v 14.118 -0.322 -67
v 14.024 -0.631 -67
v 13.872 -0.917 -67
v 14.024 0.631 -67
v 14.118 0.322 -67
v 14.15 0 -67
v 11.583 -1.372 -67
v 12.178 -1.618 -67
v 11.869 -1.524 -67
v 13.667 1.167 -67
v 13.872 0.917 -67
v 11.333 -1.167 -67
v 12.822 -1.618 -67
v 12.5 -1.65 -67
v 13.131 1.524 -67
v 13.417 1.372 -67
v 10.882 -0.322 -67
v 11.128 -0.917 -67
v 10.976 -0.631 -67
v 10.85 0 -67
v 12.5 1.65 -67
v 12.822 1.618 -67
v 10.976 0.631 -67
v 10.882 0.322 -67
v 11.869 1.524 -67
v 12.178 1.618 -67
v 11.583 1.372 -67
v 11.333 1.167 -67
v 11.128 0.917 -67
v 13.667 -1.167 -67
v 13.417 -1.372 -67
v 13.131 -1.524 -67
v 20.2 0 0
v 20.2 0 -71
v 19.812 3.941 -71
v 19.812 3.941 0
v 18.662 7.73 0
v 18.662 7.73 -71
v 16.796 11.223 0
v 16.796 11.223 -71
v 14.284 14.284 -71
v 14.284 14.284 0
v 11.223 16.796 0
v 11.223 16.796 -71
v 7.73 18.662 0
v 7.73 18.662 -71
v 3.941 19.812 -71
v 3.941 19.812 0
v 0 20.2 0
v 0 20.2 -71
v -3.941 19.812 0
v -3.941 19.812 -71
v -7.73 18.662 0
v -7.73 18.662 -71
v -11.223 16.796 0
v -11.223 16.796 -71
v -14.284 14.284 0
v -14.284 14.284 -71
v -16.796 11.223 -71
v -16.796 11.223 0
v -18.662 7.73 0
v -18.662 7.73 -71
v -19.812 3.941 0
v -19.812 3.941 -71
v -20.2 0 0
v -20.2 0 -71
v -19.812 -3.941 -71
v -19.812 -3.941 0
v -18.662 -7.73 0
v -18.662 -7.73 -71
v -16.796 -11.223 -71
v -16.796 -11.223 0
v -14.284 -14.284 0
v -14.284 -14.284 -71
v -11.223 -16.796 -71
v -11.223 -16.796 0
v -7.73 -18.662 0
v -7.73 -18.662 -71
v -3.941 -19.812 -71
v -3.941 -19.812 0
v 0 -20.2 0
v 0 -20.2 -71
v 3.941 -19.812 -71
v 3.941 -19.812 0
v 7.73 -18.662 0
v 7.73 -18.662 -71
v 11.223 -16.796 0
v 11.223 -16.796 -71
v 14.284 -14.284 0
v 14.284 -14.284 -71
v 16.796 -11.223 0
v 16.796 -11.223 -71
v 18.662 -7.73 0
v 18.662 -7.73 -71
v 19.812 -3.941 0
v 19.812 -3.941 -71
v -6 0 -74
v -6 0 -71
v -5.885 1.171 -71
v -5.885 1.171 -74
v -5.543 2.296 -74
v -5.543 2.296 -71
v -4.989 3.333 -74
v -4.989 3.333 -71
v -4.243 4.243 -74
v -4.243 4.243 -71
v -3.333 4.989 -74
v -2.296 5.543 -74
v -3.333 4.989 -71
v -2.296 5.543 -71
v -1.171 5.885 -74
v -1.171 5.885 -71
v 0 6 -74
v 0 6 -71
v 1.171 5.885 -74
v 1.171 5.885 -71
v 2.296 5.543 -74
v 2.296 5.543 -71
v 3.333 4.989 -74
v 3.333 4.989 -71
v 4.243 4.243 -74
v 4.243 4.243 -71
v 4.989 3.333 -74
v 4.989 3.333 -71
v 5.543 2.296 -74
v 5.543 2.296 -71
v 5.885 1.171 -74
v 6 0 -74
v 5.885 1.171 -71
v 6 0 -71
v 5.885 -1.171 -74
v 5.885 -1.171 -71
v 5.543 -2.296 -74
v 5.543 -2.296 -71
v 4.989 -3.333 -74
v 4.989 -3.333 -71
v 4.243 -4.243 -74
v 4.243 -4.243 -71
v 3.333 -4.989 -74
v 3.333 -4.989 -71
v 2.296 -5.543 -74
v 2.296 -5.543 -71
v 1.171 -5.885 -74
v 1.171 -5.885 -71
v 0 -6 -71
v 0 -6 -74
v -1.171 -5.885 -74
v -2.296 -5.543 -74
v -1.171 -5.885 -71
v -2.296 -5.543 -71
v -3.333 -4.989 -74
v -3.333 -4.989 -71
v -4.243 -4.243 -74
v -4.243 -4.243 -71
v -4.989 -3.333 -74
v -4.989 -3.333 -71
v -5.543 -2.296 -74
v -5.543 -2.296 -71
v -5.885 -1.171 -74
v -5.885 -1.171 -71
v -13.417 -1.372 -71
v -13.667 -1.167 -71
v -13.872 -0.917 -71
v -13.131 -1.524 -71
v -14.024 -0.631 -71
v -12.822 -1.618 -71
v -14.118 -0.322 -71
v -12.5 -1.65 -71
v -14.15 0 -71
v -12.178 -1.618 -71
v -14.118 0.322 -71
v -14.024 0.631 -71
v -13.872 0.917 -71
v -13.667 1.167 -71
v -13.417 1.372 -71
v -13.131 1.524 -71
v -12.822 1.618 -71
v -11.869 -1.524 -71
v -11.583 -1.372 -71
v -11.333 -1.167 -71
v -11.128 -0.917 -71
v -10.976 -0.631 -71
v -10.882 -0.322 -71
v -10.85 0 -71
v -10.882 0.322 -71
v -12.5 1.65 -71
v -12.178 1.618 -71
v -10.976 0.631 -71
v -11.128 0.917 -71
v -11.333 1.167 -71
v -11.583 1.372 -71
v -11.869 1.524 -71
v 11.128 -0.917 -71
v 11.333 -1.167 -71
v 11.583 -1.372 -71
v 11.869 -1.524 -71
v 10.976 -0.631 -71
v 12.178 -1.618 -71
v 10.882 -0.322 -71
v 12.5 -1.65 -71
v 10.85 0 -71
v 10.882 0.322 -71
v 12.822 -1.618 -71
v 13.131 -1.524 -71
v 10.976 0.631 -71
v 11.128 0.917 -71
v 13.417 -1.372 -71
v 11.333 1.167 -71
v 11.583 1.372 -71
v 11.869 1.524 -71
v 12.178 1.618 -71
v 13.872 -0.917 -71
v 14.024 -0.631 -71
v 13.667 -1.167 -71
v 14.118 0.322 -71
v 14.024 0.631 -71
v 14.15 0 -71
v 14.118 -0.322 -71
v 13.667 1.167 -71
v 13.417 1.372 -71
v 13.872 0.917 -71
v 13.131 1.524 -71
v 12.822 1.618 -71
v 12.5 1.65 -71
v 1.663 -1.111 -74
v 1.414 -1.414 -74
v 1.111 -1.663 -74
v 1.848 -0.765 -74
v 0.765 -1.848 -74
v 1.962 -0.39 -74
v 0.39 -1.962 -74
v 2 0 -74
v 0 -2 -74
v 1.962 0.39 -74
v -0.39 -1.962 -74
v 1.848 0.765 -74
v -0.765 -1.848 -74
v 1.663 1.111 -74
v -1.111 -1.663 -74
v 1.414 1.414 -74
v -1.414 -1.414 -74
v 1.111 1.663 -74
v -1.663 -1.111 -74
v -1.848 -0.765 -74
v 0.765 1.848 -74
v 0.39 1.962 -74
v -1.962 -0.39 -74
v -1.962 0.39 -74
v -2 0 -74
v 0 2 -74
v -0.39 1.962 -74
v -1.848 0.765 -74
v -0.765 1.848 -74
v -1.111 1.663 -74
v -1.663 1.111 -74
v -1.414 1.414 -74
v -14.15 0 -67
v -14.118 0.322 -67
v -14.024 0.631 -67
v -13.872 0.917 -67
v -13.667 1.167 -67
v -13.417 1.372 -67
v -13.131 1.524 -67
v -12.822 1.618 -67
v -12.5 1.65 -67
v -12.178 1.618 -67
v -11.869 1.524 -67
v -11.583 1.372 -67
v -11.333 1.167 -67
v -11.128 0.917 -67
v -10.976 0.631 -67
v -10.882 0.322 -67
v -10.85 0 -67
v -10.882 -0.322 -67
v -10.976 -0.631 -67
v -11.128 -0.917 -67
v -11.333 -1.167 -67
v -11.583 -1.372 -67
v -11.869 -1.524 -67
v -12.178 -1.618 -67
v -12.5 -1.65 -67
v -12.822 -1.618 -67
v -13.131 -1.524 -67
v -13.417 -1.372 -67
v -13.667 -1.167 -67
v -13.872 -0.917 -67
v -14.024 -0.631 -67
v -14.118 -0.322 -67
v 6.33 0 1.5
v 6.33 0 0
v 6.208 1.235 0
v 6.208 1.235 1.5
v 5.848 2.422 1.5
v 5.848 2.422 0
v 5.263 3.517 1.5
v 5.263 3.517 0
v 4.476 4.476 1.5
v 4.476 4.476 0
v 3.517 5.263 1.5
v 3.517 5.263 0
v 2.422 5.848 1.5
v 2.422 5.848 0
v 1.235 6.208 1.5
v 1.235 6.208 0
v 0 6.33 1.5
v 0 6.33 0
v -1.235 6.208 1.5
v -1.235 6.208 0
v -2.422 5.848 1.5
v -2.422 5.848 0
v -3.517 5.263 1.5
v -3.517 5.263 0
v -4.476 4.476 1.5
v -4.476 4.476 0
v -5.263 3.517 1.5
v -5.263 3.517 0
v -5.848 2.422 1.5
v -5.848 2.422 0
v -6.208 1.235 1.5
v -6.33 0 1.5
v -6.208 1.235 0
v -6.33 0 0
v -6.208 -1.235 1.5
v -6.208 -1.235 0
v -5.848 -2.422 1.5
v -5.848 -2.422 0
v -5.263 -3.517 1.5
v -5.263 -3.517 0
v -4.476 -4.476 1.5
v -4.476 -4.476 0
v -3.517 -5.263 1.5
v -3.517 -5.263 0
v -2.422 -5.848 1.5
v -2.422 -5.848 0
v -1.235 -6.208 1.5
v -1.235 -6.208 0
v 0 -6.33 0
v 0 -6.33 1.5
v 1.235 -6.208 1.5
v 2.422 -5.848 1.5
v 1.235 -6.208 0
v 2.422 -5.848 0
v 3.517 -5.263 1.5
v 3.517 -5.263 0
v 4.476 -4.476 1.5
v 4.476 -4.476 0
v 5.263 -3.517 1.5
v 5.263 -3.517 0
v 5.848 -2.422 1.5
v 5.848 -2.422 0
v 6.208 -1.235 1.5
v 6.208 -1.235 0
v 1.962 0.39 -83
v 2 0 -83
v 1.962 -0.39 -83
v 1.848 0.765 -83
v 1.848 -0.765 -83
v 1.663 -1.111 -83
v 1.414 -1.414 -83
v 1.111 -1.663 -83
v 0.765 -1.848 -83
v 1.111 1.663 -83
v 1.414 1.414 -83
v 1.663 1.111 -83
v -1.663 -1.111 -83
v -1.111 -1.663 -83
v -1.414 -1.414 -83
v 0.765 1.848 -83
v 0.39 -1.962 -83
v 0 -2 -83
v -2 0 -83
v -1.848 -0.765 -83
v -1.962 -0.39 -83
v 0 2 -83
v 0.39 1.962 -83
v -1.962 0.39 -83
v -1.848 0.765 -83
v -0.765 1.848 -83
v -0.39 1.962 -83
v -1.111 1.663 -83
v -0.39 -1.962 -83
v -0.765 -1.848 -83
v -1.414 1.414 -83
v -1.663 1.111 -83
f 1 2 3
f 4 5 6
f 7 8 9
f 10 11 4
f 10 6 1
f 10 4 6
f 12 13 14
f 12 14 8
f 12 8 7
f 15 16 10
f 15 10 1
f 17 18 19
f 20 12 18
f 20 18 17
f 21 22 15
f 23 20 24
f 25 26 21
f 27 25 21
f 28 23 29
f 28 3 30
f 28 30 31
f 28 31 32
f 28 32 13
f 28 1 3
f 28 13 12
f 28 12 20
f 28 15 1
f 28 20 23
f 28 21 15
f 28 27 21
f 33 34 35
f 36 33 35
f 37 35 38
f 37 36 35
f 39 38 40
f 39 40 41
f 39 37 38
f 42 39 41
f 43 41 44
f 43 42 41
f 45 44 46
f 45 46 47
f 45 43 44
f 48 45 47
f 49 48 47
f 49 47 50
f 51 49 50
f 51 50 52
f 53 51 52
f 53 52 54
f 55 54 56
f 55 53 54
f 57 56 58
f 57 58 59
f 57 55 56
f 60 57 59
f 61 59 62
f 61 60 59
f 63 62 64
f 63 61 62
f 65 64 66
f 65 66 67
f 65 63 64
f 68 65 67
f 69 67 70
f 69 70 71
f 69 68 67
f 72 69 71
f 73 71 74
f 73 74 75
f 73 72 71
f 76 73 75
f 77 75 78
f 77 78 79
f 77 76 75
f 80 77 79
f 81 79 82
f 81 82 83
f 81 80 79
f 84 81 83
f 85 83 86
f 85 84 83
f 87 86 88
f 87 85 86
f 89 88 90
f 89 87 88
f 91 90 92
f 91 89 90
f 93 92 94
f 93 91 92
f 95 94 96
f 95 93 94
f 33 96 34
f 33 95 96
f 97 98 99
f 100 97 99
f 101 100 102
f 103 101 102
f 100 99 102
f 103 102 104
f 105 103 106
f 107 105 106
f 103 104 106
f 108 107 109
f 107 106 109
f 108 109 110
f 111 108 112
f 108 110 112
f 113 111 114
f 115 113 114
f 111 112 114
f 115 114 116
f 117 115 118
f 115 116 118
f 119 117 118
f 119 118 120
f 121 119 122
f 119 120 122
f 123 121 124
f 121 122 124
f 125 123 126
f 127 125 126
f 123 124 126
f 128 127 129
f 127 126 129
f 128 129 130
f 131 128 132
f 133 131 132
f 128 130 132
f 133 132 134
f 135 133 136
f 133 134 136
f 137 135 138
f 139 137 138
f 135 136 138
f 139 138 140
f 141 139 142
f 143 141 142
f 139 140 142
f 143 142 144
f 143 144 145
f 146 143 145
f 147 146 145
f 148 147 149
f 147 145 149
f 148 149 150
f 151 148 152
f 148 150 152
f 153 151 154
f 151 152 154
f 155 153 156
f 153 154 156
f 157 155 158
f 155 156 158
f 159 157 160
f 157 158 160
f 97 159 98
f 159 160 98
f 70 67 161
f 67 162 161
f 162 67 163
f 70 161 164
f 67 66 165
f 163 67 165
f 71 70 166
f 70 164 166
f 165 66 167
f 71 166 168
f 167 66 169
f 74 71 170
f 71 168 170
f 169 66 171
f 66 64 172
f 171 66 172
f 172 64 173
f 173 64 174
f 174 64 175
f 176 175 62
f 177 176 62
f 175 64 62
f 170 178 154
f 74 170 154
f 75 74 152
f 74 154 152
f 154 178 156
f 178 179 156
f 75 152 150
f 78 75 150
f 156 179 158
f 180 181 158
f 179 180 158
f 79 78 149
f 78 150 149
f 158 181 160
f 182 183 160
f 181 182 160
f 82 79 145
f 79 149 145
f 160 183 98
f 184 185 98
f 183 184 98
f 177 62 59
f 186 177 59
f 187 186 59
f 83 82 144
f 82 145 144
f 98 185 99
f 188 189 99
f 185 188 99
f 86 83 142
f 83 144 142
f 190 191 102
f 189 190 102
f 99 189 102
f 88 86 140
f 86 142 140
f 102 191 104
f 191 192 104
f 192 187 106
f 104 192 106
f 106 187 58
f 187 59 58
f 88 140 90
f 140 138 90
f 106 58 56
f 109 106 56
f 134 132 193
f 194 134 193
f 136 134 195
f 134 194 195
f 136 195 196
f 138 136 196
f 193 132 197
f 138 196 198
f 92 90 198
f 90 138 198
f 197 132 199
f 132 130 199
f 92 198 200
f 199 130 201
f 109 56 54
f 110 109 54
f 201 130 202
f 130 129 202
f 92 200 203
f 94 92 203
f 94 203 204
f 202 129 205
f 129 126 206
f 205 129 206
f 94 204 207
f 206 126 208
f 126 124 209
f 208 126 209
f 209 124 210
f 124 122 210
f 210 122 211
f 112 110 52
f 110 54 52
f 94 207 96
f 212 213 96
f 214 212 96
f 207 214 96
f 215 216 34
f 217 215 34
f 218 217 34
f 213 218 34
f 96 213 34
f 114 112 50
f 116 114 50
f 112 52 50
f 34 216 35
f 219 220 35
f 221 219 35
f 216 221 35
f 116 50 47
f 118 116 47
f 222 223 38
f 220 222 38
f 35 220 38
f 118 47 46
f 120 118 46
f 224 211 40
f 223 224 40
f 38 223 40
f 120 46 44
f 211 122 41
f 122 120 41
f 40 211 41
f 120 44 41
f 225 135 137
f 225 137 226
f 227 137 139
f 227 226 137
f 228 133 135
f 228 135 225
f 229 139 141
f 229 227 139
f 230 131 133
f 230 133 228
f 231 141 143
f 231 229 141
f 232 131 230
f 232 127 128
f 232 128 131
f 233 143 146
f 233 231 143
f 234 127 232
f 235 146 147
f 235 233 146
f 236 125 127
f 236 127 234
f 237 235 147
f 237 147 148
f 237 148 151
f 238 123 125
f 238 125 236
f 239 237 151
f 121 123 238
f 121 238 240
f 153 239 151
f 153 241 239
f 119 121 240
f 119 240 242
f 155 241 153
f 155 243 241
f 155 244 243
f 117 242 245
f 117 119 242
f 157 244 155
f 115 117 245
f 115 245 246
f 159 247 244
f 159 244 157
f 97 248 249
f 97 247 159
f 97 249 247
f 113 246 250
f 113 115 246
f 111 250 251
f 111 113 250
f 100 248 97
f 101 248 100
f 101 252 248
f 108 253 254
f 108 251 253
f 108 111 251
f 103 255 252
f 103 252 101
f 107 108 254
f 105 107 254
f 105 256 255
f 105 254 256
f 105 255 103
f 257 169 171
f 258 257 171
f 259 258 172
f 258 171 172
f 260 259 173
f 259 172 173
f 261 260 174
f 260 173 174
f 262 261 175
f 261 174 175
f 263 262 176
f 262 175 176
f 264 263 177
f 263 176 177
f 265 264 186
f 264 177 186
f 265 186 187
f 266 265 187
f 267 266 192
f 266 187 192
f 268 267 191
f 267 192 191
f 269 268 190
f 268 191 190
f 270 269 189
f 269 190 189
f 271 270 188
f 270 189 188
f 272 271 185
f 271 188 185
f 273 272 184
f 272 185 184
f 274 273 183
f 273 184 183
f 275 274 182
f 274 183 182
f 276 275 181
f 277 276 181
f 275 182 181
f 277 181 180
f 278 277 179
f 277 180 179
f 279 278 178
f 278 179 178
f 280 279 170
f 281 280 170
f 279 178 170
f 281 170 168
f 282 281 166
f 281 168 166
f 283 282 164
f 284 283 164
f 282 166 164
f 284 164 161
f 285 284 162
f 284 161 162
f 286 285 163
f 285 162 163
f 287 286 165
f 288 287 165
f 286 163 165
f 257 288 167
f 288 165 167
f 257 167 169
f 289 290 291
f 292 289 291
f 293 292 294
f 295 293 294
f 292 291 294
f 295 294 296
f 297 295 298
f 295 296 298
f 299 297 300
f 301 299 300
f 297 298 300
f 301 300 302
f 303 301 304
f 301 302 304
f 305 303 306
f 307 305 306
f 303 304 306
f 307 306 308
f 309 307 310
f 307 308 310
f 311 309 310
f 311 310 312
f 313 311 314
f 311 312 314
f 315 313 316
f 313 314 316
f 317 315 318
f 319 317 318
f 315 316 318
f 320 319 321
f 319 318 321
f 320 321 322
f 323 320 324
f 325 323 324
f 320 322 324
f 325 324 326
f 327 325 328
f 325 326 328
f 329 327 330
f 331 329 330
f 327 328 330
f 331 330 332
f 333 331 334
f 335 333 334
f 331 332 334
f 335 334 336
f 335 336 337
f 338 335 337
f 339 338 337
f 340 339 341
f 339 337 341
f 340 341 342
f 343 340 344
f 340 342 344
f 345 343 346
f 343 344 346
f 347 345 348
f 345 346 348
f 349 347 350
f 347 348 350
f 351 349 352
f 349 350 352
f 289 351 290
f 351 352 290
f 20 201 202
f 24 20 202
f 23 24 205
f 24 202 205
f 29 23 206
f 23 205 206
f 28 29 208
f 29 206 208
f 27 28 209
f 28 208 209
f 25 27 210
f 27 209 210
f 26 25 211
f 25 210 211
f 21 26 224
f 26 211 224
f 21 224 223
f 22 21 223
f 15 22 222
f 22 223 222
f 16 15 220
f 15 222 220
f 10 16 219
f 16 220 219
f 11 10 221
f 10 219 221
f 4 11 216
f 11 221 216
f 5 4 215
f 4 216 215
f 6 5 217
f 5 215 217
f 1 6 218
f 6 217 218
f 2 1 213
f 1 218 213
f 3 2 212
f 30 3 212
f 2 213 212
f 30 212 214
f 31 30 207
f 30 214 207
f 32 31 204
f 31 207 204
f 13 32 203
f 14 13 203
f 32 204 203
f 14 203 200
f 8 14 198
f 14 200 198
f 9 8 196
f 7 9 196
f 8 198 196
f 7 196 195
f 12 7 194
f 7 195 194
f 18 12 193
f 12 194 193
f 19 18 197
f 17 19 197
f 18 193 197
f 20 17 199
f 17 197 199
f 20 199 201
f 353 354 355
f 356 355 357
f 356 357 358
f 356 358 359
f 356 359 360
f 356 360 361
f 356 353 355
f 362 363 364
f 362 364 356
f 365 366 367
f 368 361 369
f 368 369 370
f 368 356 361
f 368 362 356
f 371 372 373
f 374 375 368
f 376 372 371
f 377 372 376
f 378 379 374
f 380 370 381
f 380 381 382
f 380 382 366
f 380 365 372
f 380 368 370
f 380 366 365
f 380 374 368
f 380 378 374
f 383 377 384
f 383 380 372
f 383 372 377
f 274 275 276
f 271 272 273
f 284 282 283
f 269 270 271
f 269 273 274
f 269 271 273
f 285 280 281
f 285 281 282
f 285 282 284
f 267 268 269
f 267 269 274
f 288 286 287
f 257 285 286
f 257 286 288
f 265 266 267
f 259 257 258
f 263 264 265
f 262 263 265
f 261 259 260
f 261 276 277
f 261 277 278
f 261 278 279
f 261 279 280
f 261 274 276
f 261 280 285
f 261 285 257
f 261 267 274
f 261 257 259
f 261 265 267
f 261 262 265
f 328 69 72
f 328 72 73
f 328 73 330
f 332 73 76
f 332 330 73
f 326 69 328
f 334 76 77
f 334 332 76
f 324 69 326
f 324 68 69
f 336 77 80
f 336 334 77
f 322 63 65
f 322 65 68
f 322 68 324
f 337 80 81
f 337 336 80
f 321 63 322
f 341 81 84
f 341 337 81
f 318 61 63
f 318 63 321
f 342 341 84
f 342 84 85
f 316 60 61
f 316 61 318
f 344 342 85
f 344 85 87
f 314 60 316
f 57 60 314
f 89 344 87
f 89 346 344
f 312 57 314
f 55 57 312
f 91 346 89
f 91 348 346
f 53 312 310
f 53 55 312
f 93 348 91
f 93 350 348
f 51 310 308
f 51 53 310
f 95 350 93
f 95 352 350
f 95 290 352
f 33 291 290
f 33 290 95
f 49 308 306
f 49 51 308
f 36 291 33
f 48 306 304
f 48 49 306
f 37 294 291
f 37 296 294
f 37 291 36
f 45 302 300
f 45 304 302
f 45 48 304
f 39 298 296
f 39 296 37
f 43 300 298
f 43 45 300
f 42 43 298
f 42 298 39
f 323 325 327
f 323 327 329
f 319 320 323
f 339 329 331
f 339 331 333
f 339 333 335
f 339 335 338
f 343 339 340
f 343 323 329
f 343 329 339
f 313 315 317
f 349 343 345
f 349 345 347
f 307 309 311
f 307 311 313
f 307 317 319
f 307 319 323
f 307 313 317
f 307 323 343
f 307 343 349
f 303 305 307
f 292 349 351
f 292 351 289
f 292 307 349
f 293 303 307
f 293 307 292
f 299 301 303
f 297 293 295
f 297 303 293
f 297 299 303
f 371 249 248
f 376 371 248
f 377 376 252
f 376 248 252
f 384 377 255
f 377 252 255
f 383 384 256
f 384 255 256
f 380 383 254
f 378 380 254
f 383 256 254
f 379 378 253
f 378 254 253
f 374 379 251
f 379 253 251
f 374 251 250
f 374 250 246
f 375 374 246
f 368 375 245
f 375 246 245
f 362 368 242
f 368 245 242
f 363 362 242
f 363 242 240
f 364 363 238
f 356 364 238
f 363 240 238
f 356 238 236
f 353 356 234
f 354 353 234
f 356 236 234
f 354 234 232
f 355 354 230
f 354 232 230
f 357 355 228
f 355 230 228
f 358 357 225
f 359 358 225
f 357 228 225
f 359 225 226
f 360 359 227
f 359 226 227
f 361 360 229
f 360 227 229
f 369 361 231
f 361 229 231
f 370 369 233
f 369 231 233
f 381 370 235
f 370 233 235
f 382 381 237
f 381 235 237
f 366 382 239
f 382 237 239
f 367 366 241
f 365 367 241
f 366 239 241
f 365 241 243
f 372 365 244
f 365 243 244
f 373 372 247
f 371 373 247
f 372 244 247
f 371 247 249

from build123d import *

# Parameters (mm, degrees)
SKETCH1_R           = 6.33
BOSS_EXTRUDE1_DEPTH = 1.5
SKETCH2_R           = 20.2
BOSS_EXTRUDE2_DEPTH = 71
SKETCH6_R           = 6
BOSS_EXTRUDE4_DEPTH = 3
SKETCH7_R           = 2
BOSS_EXTRUDE5_DEPTH = 9
SKETCH8_R           = 1.65
CUT_EXTRUDE1_DEPTH  = 4


with BuildPart() as part:
    # Sketch1 → Boss-Extrude1 (new body)
    with BuildSketch(Plane.XY):
        Circle(SKETCH1_R)
    extrude(amount=BOSS_EXTRUDE1_DEPTH)

    # Sketch2 → Boss-Extrude2 (add)
    with BuildSketch(Plane.XY):
        Circle(SKETCH2_R)
    extrude(amount=-BOSS_EXTRUDE2_DEPTH)

    # Sketch6 → Boss-Extrude4 (add)
    with BuildSketch(Plane(origin=(0, 0, -71), x_dir=(-1, 0, 0), z_dir=(0, 0, -1))):
        Circle(SKETCH6_R)
    extrude(amount=BOSS_EXTRUDE4_DEPTH)

    # Sketch7 → Boss-Extrude5 (add)
    with BuildSketch(Plane(origin=(0, 0, -74), x_dir=(-1, 0, 0), z_dir=(0, 0, -1))):
        Circle(SKETCH7_R)
    extrude(amount=BOSS_EXTRUDE5_DEPTH)

    # Sketch8 → Cut-Extrude1 (cut)
    with BuildSketch(Plane(origin=(0, 0, -71), x_dir=(-1, 0, 0), z_dir=(0, 0, -1))):
        with Locations((-12.5, 0)):
            Circle(SKETCH8_R)
        with Locations((12.5, 0)):
            Circle(SKETCH8_R)
    extrude(amount=-CUT_EXTRUDE1_DEPTH, mode=Mode.SUBTRACT)


solid = part.part
